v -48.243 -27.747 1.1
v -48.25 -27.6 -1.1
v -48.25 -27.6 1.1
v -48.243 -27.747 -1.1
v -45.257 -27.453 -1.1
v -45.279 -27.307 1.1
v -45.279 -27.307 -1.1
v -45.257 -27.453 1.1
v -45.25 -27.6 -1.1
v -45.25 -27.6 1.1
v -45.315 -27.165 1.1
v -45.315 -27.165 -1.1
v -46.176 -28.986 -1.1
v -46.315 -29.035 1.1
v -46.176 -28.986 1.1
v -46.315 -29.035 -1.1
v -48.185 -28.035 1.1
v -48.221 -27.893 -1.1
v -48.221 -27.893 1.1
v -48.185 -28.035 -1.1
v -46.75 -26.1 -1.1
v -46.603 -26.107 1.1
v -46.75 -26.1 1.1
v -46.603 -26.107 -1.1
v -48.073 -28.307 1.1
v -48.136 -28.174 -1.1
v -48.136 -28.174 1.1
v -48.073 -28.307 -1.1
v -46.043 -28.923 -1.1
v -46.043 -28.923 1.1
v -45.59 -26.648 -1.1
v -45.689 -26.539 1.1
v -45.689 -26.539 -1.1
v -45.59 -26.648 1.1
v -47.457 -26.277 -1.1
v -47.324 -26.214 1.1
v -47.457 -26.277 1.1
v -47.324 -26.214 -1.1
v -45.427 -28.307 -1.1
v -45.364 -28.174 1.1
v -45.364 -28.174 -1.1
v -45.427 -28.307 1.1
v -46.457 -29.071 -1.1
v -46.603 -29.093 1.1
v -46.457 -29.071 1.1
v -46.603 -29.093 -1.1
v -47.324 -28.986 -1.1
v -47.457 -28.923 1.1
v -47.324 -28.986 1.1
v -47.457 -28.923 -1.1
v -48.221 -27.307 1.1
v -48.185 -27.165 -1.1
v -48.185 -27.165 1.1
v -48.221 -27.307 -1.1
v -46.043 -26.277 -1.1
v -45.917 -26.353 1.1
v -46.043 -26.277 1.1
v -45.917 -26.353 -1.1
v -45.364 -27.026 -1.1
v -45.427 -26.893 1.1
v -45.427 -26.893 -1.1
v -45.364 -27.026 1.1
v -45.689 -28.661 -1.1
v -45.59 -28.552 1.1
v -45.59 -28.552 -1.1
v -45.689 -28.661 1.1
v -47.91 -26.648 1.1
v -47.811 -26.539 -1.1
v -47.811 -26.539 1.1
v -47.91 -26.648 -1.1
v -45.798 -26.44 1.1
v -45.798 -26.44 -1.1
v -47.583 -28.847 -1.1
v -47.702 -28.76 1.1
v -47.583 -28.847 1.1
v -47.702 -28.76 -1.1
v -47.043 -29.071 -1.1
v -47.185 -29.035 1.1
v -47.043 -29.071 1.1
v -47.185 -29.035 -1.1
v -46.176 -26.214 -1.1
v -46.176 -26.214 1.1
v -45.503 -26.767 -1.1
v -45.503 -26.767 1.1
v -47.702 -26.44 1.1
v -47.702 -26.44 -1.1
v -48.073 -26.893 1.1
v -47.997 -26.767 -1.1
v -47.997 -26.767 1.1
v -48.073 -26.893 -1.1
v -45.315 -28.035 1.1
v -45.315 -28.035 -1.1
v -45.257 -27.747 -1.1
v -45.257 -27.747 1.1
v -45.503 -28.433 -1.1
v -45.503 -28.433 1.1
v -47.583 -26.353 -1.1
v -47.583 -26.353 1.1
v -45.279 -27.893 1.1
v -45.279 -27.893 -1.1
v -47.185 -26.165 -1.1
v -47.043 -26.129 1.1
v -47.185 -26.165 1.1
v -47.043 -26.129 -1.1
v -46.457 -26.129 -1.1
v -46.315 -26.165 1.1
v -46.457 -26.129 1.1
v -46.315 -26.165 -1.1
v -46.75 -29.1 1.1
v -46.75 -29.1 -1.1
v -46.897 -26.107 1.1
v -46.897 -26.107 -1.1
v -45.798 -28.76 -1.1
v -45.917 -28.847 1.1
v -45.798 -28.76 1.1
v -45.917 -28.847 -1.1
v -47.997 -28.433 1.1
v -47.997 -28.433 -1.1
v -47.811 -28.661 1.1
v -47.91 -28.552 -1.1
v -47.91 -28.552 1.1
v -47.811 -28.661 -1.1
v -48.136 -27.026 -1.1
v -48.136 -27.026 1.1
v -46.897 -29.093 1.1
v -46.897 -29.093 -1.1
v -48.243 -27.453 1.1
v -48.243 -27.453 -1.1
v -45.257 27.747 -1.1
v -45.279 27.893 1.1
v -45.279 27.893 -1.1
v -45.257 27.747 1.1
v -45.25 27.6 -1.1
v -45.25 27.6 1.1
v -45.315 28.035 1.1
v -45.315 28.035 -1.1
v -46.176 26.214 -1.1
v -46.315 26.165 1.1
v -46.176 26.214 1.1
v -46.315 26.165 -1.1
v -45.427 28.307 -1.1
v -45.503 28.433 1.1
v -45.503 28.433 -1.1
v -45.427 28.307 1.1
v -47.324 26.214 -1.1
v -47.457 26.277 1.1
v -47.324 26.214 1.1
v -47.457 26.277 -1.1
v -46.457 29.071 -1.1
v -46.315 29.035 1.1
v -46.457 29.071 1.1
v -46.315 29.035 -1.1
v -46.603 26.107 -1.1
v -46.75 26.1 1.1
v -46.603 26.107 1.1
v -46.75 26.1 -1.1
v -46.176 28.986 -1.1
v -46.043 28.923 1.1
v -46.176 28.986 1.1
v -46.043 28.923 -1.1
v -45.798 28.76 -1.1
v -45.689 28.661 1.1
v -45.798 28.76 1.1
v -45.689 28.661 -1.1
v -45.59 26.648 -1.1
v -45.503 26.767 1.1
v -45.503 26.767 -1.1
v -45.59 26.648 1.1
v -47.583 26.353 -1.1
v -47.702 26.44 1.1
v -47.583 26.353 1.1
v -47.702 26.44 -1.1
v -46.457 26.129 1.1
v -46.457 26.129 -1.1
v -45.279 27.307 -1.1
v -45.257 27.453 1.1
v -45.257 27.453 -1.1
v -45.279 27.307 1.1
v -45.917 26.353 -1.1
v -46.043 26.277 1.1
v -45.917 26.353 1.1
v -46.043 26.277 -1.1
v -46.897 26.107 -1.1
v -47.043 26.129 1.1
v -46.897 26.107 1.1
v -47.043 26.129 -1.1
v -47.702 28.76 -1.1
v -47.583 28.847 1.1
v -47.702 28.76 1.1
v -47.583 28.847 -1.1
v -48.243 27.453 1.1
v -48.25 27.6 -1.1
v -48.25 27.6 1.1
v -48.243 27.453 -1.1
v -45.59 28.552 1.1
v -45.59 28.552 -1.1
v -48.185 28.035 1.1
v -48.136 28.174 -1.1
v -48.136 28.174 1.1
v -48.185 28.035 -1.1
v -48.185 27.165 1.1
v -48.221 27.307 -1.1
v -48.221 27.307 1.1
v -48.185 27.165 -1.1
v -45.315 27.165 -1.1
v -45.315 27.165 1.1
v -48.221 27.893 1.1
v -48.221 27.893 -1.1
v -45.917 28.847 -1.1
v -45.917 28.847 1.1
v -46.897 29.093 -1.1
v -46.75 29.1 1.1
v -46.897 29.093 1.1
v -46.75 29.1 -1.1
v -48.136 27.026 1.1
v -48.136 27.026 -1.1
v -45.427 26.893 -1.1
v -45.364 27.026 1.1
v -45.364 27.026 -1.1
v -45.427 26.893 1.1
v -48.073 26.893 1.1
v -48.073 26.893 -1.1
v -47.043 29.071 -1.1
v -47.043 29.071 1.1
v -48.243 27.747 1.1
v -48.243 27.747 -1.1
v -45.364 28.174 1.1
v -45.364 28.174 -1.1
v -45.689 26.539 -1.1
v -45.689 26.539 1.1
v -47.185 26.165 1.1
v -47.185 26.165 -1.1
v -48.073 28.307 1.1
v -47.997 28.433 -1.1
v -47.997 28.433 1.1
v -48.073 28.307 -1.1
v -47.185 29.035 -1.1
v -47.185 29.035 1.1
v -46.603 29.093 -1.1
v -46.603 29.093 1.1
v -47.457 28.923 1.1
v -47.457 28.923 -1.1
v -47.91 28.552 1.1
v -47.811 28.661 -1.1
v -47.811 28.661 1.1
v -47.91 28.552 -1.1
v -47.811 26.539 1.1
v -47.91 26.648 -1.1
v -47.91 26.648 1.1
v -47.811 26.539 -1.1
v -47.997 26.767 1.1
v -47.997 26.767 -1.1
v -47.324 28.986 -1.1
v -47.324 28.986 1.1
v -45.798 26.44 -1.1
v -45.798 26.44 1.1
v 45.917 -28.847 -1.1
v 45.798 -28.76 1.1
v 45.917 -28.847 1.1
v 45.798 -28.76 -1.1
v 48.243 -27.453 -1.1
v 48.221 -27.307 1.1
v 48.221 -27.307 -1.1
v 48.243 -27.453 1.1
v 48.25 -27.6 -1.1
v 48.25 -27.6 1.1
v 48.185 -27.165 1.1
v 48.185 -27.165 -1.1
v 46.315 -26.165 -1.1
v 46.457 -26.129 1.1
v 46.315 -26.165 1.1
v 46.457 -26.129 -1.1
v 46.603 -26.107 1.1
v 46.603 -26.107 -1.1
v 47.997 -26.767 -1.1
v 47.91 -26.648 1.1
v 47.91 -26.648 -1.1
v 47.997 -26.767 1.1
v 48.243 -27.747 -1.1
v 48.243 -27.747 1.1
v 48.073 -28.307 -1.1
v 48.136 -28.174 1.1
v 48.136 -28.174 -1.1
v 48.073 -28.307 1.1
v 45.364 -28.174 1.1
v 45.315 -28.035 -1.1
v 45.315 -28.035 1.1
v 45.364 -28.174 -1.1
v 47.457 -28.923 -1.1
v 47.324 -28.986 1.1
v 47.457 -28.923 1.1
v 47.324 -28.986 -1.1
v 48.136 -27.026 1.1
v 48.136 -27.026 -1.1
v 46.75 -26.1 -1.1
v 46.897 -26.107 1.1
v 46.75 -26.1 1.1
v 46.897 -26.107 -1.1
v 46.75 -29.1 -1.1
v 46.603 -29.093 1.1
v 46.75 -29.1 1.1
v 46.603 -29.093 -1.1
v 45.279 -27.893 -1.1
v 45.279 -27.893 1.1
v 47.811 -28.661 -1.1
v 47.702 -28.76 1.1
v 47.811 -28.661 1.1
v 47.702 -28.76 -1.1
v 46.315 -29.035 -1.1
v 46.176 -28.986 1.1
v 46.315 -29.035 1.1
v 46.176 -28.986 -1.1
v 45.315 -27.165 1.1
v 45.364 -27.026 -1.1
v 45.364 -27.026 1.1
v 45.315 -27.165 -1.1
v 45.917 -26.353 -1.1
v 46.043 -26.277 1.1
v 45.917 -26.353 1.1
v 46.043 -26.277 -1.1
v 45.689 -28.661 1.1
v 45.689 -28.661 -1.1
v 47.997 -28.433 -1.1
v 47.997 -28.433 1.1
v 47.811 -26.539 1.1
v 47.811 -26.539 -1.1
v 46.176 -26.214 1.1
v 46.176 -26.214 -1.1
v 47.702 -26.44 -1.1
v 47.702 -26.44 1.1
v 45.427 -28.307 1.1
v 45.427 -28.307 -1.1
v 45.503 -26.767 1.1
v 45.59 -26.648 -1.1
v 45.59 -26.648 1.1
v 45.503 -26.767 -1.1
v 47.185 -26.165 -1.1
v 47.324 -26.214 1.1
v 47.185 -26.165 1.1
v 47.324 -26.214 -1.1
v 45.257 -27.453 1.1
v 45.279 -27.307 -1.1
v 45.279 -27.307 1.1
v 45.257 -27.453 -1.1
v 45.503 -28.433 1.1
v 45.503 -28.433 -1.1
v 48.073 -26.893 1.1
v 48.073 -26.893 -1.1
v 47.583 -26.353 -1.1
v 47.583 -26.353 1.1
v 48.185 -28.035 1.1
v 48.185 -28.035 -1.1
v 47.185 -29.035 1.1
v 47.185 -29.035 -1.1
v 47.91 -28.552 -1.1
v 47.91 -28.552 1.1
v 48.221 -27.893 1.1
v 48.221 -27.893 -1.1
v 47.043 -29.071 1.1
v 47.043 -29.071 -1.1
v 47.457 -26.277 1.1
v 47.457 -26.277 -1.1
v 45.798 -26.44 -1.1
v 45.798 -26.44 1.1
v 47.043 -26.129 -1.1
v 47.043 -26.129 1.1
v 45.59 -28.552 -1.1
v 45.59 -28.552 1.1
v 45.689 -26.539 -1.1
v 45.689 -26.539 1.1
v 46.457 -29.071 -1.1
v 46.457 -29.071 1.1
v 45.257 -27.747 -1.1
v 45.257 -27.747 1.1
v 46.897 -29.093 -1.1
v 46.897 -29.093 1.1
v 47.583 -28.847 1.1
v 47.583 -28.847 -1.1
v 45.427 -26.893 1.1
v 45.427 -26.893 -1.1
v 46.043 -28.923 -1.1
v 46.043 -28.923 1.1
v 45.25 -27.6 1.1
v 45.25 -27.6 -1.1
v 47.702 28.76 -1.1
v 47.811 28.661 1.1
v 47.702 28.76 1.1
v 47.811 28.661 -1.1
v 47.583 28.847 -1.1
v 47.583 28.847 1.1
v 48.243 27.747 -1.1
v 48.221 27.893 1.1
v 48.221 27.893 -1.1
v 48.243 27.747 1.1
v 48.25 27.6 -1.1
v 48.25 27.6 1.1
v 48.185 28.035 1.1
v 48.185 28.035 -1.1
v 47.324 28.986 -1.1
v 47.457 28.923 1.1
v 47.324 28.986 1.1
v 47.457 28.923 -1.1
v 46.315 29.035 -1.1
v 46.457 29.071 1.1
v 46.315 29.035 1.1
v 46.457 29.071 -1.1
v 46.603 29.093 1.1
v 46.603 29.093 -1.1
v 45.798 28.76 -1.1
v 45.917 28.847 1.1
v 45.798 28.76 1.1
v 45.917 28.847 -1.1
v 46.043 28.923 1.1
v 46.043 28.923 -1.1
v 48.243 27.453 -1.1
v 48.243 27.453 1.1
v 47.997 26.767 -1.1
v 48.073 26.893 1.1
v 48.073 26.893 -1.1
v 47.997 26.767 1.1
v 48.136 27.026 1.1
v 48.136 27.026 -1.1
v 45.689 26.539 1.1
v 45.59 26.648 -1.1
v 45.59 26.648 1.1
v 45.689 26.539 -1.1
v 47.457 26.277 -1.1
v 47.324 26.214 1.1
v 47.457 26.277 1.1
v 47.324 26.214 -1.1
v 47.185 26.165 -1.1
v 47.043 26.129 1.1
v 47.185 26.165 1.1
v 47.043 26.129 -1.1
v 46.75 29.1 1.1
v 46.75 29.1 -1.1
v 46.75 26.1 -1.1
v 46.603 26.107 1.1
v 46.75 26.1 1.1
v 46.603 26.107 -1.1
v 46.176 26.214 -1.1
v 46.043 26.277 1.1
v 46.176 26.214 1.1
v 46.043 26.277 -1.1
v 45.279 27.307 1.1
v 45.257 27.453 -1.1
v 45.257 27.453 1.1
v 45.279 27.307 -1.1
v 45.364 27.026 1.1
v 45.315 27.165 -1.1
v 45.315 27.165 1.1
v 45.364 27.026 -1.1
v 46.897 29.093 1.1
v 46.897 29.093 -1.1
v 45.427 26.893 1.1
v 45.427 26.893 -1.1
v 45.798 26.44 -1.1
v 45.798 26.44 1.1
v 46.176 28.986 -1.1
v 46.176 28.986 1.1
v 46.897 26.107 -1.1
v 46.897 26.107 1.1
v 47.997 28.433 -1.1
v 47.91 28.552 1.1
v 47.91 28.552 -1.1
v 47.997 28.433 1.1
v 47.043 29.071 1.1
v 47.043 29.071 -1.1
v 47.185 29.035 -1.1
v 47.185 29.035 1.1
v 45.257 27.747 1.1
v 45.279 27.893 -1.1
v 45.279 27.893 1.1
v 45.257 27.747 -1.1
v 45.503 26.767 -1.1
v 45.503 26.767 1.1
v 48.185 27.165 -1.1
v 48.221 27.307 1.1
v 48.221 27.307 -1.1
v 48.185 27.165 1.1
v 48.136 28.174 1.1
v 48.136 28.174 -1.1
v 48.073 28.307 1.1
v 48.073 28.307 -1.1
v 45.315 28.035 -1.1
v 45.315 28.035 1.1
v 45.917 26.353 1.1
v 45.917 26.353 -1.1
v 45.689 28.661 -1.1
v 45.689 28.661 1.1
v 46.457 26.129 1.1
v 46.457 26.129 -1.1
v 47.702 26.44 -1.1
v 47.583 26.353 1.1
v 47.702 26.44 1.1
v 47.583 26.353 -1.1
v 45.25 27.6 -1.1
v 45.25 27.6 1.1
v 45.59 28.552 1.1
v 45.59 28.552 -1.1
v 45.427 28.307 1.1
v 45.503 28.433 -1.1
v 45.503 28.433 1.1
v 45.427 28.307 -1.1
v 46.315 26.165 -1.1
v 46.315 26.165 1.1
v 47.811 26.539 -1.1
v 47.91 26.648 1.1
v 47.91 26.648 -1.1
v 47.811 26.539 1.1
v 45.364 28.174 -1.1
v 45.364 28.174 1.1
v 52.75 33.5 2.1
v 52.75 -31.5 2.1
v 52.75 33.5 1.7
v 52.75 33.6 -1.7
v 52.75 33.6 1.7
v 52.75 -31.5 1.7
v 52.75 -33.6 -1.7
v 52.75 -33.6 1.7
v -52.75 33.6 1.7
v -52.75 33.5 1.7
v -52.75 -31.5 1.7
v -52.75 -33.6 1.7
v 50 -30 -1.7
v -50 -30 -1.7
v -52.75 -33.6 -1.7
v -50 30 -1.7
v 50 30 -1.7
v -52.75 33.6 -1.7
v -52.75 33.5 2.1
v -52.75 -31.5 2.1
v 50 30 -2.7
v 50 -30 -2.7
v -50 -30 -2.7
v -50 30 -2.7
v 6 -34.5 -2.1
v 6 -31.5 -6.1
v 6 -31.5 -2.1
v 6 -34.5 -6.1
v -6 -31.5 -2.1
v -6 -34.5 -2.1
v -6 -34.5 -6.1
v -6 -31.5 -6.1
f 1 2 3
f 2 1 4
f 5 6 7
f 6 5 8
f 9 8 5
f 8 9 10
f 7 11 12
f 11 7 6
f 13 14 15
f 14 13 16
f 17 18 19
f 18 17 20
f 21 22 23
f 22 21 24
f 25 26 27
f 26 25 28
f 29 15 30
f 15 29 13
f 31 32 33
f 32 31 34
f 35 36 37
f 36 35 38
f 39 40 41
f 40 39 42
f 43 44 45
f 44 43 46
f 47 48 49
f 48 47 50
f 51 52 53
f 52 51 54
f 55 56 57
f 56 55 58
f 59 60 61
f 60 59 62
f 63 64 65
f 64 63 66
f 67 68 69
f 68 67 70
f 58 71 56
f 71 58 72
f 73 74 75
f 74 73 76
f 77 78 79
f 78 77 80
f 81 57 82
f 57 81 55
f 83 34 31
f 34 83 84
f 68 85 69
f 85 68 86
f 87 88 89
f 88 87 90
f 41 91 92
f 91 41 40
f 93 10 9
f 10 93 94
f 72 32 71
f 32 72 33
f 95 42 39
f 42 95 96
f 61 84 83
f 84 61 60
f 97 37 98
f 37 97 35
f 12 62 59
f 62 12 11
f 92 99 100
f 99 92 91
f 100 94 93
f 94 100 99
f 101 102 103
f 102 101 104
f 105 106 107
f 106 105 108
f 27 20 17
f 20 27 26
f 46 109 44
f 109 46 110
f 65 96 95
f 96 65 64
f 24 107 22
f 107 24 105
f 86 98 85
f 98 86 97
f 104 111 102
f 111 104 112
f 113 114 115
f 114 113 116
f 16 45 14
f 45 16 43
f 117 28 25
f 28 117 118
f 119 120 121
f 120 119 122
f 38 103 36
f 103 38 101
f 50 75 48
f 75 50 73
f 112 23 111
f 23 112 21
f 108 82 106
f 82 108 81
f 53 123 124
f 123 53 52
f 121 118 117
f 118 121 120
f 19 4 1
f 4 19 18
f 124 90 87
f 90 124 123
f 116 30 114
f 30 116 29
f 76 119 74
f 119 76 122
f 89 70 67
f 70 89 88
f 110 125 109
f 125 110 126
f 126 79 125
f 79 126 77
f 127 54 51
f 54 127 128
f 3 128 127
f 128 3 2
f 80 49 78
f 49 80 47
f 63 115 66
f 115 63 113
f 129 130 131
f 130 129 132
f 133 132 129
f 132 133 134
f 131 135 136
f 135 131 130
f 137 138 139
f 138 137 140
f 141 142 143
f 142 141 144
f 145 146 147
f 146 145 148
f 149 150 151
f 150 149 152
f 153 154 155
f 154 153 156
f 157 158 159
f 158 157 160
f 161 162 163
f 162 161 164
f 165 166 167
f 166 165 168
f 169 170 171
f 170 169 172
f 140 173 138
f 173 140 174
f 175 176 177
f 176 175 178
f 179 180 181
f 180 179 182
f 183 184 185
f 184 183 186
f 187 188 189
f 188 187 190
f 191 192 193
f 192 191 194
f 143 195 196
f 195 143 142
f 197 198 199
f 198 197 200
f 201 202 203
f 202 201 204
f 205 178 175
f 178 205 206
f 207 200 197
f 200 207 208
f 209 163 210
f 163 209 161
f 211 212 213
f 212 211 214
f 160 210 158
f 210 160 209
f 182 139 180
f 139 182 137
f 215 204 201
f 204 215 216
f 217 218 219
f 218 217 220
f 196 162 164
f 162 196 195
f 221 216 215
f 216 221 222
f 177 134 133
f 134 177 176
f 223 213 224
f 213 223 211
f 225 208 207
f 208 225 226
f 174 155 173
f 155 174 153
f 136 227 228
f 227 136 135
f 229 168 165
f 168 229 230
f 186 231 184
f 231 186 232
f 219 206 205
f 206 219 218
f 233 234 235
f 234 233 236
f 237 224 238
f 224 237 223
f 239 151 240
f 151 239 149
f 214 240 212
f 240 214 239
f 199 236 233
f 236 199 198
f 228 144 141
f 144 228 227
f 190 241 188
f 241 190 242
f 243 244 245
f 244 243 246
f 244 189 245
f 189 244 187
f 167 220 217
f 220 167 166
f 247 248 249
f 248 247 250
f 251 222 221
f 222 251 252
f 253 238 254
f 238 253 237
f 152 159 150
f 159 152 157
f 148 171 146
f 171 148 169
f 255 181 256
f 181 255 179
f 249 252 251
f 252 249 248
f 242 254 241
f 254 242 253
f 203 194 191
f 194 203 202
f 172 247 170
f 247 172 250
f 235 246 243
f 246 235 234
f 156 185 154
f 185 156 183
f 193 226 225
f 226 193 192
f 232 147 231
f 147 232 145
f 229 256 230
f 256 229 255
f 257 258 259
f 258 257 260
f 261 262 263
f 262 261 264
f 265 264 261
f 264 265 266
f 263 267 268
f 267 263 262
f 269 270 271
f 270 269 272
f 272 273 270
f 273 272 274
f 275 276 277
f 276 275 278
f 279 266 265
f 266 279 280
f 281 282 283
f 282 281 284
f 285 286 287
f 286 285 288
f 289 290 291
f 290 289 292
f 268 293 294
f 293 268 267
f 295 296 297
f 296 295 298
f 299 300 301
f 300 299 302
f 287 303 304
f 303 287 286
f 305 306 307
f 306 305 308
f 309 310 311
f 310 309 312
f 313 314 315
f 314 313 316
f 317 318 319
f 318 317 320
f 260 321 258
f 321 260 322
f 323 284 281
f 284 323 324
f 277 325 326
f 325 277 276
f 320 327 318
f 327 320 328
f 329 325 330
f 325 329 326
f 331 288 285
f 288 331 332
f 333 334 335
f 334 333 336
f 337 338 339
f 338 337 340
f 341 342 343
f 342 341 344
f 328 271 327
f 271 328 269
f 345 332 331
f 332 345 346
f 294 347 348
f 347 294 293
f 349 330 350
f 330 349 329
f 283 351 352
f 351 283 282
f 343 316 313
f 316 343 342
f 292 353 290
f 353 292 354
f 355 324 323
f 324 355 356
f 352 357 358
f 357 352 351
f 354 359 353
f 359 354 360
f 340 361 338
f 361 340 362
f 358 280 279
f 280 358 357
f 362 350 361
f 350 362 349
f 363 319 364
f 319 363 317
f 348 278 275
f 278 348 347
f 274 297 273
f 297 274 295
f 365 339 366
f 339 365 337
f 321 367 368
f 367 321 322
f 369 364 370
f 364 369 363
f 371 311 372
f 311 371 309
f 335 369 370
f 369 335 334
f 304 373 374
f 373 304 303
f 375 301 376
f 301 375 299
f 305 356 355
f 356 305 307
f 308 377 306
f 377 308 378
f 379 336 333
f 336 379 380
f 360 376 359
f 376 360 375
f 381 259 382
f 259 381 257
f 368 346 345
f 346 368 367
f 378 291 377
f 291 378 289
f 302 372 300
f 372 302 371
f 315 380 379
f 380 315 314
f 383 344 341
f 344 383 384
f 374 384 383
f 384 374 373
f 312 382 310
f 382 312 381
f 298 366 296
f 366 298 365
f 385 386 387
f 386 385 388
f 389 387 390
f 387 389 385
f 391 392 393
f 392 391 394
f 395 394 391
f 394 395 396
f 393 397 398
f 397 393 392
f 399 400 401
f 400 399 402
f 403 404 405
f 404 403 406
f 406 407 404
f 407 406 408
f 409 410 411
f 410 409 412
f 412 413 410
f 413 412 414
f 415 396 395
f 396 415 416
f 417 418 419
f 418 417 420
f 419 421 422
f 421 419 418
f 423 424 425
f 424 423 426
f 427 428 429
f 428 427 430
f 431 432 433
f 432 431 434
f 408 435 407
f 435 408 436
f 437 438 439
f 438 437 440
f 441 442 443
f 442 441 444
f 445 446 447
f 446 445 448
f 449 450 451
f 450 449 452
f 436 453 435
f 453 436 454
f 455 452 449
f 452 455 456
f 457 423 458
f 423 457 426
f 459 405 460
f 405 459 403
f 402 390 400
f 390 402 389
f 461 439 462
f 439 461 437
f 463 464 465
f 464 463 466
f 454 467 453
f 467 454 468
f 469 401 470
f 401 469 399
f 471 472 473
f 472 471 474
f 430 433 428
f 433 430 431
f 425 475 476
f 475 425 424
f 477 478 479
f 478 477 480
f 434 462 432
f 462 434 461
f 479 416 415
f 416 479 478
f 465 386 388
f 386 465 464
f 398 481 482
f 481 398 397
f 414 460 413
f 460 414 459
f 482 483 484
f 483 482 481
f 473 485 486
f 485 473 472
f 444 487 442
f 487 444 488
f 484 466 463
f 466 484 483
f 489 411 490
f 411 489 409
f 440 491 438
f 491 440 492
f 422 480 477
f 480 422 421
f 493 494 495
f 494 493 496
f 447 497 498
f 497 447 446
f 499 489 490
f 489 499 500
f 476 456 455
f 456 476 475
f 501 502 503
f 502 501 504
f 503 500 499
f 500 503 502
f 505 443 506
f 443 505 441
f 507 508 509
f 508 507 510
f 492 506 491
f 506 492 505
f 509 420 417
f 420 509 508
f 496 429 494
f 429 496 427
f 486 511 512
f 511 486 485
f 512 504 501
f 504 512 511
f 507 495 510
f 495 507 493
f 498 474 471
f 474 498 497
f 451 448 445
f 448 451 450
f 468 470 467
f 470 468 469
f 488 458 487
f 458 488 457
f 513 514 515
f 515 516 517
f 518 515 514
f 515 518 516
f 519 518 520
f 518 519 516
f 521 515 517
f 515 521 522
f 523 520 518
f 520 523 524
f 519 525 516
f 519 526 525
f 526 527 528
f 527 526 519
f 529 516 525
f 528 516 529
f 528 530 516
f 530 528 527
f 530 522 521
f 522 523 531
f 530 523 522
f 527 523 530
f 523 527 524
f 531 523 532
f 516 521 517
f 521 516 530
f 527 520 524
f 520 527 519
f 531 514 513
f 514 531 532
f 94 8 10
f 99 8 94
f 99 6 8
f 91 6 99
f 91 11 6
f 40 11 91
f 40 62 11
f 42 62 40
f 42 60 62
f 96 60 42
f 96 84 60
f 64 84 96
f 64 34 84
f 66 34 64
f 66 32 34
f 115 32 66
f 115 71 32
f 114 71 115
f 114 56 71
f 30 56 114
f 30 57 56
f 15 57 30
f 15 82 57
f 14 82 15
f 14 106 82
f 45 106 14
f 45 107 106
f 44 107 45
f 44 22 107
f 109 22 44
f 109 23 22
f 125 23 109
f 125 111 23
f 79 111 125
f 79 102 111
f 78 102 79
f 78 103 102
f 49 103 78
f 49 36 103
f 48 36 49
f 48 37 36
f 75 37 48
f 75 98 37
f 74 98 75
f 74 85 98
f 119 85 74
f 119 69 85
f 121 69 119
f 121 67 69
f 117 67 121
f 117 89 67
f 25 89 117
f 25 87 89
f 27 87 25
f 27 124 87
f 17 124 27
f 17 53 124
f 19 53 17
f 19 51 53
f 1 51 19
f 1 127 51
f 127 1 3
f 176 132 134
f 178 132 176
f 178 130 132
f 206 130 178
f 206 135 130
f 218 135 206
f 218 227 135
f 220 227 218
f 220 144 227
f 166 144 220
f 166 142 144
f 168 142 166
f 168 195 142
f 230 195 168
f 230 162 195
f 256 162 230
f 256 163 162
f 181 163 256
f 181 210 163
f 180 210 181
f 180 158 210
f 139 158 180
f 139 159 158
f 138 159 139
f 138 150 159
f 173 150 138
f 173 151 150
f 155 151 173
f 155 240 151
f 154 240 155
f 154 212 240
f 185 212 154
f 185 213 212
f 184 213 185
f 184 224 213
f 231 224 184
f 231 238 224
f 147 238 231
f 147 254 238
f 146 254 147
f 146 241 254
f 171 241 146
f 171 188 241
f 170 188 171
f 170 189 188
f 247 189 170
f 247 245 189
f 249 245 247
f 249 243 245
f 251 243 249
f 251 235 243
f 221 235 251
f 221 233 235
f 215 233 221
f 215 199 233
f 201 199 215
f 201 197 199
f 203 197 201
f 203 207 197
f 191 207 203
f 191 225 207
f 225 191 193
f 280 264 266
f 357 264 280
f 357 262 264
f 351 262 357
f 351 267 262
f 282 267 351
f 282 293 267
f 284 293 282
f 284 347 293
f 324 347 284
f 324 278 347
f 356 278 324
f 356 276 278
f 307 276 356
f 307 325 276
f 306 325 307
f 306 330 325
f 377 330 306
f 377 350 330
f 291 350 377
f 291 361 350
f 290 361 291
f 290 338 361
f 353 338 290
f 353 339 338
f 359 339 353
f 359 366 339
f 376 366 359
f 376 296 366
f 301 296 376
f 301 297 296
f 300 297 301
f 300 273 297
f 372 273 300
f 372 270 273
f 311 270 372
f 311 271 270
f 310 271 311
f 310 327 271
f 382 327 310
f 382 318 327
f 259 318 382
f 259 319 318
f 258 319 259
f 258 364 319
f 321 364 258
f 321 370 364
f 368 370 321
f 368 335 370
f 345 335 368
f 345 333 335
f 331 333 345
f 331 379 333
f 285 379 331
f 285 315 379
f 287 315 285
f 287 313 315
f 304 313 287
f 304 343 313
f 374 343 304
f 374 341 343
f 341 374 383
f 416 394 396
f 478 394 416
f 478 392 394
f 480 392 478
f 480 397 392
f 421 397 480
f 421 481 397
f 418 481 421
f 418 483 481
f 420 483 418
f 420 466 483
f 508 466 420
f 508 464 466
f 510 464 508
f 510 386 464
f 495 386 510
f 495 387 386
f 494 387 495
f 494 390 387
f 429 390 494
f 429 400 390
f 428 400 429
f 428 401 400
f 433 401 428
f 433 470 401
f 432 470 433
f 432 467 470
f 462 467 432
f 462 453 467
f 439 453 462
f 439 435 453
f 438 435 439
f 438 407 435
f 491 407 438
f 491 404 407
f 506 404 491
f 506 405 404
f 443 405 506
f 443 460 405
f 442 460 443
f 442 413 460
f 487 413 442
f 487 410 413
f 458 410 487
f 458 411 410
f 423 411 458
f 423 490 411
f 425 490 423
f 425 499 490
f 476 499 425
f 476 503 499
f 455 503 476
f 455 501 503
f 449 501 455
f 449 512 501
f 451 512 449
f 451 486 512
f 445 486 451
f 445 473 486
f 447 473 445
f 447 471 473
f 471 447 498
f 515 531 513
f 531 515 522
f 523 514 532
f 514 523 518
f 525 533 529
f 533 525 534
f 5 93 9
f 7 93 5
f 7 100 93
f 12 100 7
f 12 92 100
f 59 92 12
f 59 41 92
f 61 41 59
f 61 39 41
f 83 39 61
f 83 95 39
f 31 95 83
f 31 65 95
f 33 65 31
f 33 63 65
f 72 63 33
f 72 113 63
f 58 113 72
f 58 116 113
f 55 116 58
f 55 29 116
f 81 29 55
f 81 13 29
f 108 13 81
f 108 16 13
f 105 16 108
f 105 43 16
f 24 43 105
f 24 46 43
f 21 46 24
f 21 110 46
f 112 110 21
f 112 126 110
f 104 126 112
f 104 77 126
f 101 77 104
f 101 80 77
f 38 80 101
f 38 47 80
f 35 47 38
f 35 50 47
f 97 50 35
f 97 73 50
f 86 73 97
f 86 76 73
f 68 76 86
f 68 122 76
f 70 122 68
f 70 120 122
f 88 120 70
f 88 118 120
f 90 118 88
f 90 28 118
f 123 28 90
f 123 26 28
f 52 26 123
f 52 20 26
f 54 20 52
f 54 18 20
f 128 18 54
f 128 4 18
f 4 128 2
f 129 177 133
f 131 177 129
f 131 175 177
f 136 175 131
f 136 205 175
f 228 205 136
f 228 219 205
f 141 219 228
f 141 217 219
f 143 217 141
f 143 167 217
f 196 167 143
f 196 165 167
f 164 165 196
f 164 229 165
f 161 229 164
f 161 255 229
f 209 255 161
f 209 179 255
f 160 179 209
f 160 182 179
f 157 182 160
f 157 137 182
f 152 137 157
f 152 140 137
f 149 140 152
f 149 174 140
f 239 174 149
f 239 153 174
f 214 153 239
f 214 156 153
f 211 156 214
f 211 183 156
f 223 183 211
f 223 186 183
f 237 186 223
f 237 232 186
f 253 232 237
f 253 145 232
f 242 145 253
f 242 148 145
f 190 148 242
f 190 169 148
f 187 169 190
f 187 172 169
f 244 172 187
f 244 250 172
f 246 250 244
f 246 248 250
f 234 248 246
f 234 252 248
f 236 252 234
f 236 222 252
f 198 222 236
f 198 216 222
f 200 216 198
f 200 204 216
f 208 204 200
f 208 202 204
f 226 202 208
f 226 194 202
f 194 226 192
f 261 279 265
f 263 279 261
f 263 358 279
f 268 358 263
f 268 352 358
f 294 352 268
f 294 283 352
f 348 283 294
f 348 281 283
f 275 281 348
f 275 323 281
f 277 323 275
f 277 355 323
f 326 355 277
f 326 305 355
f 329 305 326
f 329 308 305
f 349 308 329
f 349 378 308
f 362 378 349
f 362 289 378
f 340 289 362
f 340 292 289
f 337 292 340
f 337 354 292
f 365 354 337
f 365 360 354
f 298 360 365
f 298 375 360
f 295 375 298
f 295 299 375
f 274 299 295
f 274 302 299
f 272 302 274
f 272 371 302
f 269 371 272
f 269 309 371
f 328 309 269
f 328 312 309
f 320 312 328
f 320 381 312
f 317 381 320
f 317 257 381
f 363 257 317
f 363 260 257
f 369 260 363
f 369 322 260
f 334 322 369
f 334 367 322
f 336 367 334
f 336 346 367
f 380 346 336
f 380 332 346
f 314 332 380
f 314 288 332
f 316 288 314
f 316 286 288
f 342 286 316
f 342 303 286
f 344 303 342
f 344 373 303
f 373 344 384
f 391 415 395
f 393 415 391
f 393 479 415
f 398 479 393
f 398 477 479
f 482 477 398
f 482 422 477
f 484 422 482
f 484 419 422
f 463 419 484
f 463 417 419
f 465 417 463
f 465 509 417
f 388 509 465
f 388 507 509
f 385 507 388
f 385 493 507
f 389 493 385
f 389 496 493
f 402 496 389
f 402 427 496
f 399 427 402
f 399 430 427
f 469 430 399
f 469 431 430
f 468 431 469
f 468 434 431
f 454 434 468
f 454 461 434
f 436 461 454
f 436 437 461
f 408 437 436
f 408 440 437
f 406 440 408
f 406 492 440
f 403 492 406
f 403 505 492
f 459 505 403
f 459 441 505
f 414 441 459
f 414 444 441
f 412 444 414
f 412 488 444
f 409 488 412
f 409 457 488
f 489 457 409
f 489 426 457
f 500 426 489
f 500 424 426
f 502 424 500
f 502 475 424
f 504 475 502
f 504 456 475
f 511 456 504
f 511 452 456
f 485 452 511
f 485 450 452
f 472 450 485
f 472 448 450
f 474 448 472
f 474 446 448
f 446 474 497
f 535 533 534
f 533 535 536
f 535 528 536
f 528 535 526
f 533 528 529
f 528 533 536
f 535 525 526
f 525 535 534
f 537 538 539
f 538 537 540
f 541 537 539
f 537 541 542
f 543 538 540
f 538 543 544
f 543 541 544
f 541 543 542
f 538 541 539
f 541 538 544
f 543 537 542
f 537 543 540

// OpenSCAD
// LCD display 4.3"
// Overall: 105.5 x 67.2 x 3.4
// Active/aperture: [-50,-26.5] to [50,31.5] depth 0.5
// Touch/glass outline: [-105.5/2, -65/2+1] to [105.5/2, 65/2+1] thickness 1
// Connector feature region: [[0,-34.5],[12,-31.5]]

$fn = 64;

// Parameters
overall_width = 105.5;
overall_height = 67.2;
overall_thickness = 3.4;

// Aperture (active area recess)
aperture_min_x = -50;
aperture_min_y = -26.5;
aperture_max_x = 50;
aperture_max_y = 31.5;
aperture_cut_depth = 0.5;

// Glass/touch overlay
touchscreen_min_x = -overall_width/2;
touchscreen_min_y = -65/2 + 1;   // -31.5
touchscreen_max_x =  overall_width/2;
touchscreen_max_y =  65/2 + 1;   //  33.5
touchscreen_thickness = 1.0;

// Back PCB (kept smaller than body)
pcb_width = 100;
pcb_height = 60;
pcb_thickness = 1.6;
pcb_gap = 2;

// Mounting holes (through body)
mount_hole_diameter = 3;
mount_hole_edge_margin_x = 6;
mount_hole_edge_margin_y = 6;

// Back connector bump (from given points)
connector_width = 12;
connector_height = (-31.5) - (-34.5); // 3
connector_thickness = 4;
connector_center_x = 0;
connector_center_y = (-34.5 + -31.5)/2; // -33

// Robustness
overlap = 0.6;
eps = 0.15;

// Derived
aperture_w = aperture_max_x - aperture_min_x;
aperture_h = aperture_max_y - aperture_min_y;
aperture_cx = (aperture_min_x + aperture_max_x)/2;
aperture_cy = (aperture_min_y + aperture_max_y)/2;

touch_w = touchscreen_max_x - touchscreen_min_x;
touch_h = touchscreen_max_y - touchscreen_min_y;
touch_cx = (touchscreen_min_x + touchscreen_max_x)/2;
touch_cy = (touchscreen_min_y + touchscreen_max_y)/2;

// Z layout (ensure ONE connected solid by overlapping layers)
z_body_top = overall_thickness/2;
z_body_bot = -overall_thickness/2;

// Glass overlaps into body
z_glass_center = z_body_top + touchscreen_thickness/2 - overlap;

// PCB overlaps into body (fix: previously floated due to pcb_gap)
z_pcb_center = z_body_bot - pcb_thickness/2 + overlap;

// Connector overlaps into PCB (and thus into body)
z_conn_center = z_pcb_center - pcb_thickness/2 - connector_thickness/2 + overlap;

module display_connected_solid() {
  union() {
    // Main body with recess + holes
    difference() {
      cube([overall_width, overall_height, overall_thickness], center=true);

      // Aperture recess from front face
      translate([aperture_cx, aperture_cy,
                 z_body_top - (aperture_cut_depth + eps)/2 + eps/2])
        cube([aperture_w, aperture_h, aperture_cut_depth + eps], center=true);

      // Mounting holes through body
      for (x = [-1, 1], y = [-1, 1]) {
        translate([x * (overall_width/2 - mount_hole_edge_margin_x),
                   y * (overall_height/2 - mount_hole_edge_margin_y),
                   0])
          cylinder(d=mount_hole_diameter, h=overall_thickness + 2*eps, center=true);
      }
    }

    // Glass/touch overlay
    translate([touch_cx, touch_cy, z_glass_center])
      cube([touch_w, touch_h, touchscreen_thickness], center=true);

    // Back PCB (connected to body via overlap)
    translate([0, 0, z_pcb_center])
      cube([pcb_width, pcb_height, pcb_thickness], center=true);

    // Back connector bump (connected to PCB via overlap)
    translate([connector_center_x, connector_center_y, z_conn_center])
      cube([connector_width, connector_height, connector_thickness], center=true);
  }
}

display_connected_solid();
